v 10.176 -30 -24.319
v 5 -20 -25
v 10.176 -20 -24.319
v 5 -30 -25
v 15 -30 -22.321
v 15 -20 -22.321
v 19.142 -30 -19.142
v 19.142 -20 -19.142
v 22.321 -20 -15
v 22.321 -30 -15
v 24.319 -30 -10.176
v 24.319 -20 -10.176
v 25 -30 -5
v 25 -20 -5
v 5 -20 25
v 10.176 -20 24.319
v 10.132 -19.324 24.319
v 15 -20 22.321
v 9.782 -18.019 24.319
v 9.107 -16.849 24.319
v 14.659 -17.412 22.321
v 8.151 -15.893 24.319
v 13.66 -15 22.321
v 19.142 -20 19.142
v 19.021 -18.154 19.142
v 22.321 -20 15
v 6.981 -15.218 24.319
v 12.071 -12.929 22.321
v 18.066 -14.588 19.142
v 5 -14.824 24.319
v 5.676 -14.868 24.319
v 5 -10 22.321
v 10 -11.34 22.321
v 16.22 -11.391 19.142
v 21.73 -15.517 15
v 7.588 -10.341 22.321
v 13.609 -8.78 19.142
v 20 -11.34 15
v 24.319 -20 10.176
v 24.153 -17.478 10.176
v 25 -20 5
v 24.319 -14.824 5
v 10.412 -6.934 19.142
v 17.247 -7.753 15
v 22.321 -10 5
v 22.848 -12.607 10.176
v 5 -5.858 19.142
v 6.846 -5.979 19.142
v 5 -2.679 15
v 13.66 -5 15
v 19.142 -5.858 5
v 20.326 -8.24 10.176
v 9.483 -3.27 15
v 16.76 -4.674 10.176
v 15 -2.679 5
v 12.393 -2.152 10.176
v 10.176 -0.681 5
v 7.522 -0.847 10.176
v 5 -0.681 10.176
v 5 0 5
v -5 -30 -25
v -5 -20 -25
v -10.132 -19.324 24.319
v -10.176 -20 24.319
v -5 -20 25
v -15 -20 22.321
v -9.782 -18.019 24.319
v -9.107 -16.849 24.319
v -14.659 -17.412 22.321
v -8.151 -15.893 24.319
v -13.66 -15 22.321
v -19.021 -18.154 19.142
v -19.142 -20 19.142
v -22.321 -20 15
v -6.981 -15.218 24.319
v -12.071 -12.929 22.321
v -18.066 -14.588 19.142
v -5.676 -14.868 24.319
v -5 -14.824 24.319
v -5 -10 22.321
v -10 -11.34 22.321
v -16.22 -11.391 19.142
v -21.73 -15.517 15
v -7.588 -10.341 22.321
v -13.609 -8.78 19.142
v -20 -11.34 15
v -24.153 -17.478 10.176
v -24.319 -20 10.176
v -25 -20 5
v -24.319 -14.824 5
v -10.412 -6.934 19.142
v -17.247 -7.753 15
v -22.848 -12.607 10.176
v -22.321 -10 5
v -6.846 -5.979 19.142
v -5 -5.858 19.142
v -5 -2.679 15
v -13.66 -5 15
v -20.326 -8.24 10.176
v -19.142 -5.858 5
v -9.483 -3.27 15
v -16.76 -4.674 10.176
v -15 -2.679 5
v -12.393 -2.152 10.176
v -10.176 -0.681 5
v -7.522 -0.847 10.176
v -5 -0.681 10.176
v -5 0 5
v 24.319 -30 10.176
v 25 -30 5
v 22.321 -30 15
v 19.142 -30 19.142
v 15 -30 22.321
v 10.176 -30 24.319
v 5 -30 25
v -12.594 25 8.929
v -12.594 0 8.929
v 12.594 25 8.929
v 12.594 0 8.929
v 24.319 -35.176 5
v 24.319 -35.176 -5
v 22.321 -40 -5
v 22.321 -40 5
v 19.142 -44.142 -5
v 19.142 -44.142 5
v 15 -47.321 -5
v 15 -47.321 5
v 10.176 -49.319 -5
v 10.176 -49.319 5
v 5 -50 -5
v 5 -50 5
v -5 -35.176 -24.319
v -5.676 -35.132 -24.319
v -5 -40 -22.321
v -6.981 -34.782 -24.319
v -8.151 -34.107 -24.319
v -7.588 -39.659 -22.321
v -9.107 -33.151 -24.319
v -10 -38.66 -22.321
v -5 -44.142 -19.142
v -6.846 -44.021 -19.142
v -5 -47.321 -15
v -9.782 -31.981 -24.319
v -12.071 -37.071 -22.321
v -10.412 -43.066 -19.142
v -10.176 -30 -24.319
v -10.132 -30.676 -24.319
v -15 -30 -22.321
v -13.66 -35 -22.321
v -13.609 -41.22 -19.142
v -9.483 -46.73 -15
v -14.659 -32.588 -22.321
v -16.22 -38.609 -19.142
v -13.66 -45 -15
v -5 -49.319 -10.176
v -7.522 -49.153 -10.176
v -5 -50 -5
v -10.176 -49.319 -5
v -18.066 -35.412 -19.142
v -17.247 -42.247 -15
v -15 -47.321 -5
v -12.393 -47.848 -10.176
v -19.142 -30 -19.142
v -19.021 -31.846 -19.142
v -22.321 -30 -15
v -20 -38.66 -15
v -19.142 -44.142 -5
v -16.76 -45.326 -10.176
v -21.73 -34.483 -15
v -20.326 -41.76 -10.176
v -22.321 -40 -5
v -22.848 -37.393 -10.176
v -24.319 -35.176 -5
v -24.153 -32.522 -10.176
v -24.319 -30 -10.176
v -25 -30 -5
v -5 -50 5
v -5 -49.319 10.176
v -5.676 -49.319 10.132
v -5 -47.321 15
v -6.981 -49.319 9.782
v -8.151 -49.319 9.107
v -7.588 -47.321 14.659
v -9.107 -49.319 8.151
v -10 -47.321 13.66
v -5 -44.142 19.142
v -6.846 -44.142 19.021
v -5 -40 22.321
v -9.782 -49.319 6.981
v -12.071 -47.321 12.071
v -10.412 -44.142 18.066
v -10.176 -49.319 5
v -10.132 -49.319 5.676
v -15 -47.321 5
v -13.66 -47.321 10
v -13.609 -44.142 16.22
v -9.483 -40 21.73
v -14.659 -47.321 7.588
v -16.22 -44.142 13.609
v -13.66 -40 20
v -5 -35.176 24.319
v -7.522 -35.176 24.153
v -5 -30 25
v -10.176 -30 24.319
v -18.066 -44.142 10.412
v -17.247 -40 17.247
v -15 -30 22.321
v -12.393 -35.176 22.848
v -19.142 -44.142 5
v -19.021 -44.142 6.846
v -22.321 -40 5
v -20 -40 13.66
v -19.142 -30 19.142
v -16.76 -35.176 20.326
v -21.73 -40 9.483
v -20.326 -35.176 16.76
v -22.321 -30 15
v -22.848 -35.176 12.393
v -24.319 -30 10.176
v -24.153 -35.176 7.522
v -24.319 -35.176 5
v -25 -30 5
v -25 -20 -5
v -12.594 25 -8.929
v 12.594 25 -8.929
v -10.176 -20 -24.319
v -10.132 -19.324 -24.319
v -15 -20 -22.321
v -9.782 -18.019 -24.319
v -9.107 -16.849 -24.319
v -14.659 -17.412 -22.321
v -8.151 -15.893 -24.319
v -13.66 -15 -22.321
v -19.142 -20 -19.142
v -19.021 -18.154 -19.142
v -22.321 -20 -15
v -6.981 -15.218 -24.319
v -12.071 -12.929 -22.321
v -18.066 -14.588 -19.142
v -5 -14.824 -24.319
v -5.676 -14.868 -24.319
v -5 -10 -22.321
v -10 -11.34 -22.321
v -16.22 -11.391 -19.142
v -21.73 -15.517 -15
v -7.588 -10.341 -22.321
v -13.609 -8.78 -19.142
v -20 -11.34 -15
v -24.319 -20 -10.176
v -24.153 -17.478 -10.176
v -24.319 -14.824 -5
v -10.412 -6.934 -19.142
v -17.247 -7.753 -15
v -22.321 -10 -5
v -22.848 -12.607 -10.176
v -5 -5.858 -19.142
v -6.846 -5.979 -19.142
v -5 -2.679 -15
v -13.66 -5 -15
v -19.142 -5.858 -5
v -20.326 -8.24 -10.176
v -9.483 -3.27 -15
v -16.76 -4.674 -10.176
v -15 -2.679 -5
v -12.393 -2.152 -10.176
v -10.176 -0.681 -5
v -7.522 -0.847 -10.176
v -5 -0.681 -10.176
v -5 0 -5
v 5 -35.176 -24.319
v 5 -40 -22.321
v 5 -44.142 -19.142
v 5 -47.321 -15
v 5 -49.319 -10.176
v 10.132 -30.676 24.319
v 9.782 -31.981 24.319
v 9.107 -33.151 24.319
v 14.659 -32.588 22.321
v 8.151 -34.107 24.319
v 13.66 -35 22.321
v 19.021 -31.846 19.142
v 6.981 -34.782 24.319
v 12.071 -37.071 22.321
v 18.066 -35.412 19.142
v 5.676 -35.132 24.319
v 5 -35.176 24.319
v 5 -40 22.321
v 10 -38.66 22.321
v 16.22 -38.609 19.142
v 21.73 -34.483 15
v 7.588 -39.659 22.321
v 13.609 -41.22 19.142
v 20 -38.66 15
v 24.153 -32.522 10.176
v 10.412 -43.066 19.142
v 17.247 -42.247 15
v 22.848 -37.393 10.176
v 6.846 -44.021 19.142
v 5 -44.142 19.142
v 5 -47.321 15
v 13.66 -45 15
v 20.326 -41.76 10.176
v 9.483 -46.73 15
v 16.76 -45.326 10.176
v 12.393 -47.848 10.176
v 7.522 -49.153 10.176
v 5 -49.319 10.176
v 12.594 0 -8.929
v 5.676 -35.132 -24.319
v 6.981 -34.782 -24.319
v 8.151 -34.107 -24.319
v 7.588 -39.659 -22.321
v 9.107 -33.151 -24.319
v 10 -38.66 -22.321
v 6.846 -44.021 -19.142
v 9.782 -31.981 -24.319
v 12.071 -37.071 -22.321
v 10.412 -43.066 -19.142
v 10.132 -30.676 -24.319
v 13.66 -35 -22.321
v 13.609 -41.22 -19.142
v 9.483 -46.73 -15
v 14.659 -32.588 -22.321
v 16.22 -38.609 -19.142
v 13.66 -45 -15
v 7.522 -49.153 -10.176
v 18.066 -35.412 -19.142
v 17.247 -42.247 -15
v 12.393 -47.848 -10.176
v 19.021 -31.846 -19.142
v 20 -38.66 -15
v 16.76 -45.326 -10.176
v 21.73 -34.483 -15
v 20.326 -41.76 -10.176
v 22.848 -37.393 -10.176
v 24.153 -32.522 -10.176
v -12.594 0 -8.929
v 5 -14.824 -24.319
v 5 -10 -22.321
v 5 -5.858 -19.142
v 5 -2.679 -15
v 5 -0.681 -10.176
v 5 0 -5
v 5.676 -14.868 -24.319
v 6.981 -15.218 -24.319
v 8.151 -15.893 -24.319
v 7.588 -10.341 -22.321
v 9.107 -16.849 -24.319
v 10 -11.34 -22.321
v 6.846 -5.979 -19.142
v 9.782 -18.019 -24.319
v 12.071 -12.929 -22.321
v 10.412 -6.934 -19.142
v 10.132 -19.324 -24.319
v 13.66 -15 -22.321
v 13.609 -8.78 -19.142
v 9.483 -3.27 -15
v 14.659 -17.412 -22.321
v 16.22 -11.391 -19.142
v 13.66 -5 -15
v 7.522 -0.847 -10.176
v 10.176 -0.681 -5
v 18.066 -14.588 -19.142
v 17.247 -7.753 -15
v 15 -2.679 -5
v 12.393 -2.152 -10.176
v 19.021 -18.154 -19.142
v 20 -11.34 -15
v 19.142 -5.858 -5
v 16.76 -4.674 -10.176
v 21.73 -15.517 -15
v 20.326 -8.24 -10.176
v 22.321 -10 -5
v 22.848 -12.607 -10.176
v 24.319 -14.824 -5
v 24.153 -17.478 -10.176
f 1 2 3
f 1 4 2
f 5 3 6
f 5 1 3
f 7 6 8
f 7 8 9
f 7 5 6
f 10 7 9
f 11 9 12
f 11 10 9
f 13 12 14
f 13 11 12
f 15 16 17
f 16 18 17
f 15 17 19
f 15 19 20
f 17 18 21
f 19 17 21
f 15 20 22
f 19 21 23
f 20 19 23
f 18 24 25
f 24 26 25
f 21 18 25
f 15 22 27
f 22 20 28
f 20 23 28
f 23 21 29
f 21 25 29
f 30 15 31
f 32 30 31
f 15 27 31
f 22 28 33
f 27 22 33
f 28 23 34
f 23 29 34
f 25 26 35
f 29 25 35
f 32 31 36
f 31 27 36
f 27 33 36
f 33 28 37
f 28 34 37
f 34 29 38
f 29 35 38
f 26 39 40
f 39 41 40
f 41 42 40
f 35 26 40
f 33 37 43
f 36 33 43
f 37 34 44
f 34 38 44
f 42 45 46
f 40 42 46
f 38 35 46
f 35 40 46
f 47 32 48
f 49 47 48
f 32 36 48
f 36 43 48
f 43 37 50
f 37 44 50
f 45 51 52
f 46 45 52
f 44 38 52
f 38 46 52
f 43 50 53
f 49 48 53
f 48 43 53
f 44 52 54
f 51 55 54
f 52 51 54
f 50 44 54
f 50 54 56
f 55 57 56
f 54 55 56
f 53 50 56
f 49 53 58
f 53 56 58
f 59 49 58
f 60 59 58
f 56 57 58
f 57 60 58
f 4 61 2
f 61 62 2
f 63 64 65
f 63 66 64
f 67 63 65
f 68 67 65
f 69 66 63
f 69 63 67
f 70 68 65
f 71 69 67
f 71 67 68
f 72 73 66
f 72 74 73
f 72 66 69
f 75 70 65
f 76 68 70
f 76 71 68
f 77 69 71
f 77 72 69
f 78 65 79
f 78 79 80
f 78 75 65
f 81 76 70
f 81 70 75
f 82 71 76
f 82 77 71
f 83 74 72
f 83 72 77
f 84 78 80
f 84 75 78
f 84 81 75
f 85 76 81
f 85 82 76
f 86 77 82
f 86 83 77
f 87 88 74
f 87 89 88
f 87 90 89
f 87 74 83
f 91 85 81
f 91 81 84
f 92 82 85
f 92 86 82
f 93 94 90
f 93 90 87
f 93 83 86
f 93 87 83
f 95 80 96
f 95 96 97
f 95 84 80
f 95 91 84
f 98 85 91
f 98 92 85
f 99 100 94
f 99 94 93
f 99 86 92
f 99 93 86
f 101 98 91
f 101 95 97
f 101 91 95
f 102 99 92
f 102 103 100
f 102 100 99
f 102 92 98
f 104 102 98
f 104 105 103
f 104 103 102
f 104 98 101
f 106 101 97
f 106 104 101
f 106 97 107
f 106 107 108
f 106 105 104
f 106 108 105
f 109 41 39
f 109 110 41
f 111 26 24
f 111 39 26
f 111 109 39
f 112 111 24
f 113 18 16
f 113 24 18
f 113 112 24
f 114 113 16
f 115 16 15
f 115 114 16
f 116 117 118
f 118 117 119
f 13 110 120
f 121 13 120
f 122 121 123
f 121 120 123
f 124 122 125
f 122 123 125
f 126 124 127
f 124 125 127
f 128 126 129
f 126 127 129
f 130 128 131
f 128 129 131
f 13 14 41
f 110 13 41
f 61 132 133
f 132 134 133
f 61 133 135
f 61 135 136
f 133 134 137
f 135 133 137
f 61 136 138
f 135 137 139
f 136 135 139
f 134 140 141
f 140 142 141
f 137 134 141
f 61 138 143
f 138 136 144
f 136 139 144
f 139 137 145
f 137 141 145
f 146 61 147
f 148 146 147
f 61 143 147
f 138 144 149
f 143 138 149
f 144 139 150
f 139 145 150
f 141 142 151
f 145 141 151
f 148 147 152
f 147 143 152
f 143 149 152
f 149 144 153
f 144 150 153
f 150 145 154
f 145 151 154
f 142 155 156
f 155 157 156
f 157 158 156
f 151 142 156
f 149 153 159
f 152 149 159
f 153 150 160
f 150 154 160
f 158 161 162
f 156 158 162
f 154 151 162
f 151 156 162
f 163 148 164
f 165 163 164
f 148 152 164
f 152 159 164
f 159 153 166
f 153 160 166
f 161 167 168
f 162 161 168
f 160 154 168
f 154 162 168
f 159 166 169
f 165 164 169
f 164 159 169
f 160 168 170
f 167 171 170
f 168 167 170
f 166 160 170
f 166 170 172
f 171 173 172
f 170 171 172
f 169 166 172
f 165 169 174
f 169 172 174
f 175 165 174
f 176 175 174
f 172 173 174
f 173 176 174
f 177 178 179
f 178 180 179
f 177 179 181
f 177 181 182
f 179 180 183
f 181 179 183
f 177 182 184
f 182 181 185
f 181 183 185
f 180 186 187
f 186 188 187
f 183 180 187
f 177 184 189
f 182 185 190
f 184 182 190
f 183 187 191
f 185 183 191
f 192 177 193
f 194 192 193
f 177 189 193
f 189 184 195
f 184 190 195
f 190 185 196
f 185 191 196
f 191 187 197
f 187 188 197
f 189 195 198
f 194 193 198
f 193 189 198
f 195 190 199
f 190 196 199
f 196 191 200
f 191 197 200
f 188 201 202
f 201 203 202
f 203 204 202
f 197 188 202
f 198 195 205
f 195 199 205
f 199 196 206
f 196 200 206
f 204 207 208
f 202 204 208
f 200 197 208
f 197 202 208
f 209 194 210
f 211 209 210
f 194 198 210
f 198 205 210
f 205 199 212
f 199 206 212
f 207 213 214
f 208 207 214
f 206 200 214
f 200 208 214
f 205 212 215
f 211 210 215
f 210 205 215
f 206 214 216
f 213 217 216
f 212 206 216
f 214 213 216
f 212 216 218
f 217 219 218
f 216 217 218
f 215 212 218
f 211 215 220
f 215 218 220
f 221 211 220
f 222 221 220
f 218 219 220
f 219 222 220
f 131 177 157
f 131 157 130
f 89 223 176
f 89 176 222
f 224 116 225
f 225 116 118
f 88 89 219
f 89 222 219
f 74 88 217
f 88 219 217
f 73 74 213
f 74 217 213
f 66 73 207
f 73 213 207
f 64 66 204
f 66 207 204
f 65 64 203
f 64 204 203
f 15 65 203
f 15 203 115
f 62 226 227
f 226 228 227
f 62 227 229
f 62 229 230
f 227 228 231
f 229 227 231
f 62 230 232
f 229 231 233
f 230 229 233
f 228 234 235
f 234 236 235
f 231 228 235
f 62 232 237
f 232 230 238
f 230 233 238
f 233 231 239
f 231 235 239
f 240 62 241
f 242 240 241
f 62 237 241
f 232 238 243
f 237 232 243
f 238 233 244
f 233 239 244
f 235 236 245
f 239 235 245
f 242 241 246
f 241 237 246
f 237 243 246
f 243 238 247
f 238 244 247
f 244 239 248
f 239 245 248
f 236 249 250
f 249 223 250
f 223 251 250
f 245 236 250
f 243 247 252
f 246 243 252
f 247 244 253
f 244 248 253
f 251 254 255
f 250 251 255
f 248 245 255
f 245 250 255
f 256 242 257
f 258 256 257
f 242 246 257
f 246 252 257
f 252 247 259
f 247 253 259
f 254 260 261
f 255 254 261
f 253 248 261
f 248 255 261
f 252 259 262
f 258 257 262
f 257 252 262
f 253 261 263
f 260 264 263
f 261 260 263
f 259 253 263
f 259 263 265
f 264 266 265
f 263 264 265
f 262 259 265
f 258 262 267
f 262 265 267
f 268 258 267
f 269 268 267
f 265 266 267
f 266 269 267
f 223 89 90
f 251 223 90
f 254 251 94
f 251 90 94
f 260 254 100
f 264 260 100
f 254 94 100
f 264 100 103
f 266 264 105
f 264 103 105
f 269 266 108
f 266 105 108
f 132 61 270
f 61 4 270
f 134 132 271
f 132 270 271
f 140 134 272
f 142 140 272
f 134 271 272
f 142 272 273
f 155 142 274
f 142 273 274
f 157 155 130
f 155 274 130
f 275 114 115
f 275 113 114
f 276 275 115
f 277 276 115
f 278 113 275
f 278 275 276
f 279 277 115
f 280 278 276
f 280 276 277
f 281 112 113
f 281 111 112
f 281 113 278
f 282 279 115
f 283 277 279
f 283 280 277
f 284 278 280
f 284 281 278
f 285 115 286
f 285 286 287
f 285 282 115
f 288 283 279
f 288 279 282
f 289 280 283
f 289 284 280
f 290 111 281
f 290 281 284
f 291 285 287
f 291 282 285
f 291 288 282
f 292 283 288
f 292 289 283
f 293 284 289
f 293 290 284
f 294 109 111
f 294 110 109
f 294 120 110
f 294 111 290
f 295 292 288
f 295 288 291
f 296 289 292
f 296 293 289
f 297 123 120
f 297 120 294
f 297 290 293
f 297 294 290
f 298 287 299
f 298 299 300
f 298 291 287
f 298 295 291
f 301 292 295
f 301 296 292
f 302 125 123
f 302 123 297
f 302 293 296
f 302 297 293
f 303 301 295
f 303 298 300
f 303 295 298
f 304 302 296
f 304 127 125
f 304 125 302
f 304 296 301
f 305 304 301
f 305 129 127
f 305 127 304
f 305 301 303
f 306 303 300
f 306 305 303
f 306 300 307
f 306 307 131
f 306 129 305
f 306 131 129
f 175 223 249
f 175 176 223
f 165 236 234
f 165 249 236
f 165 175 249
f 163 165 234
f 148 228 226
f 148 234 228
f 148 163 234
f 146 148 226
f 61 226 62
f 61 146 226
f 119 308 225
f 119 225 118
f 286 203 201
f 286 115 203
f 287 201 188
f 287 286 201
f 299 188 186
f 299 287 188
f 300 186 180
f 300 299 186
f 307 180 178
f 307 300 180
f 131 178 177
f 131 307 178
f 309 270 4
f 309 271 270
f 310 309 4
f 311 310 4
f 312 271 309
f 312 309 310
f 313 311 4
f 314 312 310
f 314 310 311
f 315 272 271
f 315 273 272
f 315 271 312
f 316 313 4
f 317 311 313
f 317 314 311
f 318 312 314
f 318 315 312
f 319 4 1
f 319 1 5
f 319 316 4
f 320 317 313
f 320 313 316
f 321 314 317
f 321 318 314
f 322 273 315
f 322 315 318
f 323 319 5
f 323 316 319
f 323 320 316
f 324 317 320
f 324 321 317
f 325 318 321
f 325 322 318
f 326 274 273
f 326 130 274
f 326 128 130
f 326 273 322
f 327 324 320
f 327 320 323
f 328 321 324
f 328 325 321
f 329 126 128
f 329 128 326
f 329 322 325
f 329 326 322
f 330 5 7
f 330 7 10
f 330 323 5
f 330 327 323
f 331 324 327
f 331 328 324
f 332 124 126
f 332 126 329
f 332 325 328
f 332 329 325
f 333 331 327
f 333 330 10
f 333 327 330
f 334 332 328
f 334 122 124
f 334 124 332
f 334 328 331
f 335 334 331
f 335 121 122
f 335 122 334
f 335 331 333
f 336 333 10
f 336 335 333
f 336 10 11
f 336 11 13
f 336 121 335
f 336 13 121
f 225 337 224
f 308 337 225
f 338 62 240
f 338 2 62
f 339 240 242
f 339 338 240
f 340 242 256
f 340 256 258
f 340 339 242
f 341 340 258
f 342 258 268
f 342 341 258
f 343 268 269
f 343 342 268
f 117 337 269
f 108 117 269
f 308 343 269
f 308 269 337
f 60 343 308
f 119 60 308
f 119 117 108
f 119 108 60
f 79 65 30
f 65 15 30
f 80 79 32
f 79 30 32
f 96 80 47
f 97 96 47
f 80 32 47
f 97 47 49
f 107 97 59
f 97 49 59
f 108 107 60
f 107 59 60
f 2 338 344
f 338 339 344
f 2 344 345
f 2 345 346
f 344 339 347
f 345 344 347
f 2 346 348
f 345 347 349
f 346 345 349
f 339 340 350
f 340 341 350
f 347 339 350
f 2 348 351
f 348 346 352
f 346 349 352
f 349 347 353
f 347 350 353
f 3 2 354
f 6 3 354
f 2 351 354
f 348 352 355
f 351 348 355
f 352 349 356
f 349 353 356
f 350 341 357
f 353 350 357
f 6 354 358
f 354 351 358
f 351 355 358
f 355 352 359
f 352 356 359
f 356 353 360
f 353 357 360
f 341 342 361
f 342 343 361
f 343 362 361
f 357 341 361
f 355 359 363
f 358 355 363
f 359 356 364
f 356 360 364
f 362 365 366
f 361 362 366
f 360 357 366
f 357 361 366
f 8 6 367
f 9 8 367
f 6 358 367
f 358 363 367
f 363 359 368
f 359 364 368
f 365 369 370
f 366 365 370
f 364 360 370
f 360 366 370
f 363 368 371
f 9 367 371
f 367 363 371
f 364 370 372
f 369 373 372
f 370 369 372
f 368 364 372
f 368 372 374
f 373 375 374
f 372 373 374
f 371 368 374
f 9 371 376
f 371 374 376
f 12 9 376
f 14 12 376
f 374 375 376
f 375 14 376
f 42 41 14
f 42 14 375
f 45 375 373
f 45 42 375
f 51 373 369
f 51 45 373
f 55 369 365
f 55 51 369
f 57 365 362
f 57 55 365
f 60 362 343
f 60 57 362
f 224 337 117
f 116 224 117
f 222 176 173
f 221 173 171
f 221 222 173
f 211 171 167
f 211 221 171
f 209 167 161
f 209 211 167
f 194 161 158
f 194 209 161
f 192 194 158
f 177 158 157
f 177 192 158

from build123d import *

# Parameters (mm, degrees)
F0_W     = 50
F0_H     = 50
F1_DEPTH = 50
F2_R     = 20
F3_W     = 25.187926
F3_H     = 17.857752
F4_DEPTH = 25


with BuildPart() as f1:
    # F0 (on Front) → F1 (new body)
    with BuildSketch(Plane.XZ):
        Rectangle(F0_W, F0_H)
    extrude(amount=F1_DEPTH)

    # F2
    f2_edges = [f1.edges().sort_by_distance(p)[0] for p in [
        (25, 0, 0),
        (-25, 0, 0),
        (25, -50, 0),
        (25, -25, 25),
        (-25, -25, 25),
        (0, 0, 25),
        (0, -50, 25),
        (-25, -50, 0),
        (0, -50, -25),
        (-25, -25, -25),
        (0, 0, -25),
        (25, -25, -25),
    ]]
    fillet(f2_edges, radius=F2_R)

    # F3 (on Front) → F4 (join)
    with BuildSketch(Plane.XZ):
        Rectangle(F3_W, F3_H)
    extrude(amount=-F4_DEPTH)


solid = f1.part
